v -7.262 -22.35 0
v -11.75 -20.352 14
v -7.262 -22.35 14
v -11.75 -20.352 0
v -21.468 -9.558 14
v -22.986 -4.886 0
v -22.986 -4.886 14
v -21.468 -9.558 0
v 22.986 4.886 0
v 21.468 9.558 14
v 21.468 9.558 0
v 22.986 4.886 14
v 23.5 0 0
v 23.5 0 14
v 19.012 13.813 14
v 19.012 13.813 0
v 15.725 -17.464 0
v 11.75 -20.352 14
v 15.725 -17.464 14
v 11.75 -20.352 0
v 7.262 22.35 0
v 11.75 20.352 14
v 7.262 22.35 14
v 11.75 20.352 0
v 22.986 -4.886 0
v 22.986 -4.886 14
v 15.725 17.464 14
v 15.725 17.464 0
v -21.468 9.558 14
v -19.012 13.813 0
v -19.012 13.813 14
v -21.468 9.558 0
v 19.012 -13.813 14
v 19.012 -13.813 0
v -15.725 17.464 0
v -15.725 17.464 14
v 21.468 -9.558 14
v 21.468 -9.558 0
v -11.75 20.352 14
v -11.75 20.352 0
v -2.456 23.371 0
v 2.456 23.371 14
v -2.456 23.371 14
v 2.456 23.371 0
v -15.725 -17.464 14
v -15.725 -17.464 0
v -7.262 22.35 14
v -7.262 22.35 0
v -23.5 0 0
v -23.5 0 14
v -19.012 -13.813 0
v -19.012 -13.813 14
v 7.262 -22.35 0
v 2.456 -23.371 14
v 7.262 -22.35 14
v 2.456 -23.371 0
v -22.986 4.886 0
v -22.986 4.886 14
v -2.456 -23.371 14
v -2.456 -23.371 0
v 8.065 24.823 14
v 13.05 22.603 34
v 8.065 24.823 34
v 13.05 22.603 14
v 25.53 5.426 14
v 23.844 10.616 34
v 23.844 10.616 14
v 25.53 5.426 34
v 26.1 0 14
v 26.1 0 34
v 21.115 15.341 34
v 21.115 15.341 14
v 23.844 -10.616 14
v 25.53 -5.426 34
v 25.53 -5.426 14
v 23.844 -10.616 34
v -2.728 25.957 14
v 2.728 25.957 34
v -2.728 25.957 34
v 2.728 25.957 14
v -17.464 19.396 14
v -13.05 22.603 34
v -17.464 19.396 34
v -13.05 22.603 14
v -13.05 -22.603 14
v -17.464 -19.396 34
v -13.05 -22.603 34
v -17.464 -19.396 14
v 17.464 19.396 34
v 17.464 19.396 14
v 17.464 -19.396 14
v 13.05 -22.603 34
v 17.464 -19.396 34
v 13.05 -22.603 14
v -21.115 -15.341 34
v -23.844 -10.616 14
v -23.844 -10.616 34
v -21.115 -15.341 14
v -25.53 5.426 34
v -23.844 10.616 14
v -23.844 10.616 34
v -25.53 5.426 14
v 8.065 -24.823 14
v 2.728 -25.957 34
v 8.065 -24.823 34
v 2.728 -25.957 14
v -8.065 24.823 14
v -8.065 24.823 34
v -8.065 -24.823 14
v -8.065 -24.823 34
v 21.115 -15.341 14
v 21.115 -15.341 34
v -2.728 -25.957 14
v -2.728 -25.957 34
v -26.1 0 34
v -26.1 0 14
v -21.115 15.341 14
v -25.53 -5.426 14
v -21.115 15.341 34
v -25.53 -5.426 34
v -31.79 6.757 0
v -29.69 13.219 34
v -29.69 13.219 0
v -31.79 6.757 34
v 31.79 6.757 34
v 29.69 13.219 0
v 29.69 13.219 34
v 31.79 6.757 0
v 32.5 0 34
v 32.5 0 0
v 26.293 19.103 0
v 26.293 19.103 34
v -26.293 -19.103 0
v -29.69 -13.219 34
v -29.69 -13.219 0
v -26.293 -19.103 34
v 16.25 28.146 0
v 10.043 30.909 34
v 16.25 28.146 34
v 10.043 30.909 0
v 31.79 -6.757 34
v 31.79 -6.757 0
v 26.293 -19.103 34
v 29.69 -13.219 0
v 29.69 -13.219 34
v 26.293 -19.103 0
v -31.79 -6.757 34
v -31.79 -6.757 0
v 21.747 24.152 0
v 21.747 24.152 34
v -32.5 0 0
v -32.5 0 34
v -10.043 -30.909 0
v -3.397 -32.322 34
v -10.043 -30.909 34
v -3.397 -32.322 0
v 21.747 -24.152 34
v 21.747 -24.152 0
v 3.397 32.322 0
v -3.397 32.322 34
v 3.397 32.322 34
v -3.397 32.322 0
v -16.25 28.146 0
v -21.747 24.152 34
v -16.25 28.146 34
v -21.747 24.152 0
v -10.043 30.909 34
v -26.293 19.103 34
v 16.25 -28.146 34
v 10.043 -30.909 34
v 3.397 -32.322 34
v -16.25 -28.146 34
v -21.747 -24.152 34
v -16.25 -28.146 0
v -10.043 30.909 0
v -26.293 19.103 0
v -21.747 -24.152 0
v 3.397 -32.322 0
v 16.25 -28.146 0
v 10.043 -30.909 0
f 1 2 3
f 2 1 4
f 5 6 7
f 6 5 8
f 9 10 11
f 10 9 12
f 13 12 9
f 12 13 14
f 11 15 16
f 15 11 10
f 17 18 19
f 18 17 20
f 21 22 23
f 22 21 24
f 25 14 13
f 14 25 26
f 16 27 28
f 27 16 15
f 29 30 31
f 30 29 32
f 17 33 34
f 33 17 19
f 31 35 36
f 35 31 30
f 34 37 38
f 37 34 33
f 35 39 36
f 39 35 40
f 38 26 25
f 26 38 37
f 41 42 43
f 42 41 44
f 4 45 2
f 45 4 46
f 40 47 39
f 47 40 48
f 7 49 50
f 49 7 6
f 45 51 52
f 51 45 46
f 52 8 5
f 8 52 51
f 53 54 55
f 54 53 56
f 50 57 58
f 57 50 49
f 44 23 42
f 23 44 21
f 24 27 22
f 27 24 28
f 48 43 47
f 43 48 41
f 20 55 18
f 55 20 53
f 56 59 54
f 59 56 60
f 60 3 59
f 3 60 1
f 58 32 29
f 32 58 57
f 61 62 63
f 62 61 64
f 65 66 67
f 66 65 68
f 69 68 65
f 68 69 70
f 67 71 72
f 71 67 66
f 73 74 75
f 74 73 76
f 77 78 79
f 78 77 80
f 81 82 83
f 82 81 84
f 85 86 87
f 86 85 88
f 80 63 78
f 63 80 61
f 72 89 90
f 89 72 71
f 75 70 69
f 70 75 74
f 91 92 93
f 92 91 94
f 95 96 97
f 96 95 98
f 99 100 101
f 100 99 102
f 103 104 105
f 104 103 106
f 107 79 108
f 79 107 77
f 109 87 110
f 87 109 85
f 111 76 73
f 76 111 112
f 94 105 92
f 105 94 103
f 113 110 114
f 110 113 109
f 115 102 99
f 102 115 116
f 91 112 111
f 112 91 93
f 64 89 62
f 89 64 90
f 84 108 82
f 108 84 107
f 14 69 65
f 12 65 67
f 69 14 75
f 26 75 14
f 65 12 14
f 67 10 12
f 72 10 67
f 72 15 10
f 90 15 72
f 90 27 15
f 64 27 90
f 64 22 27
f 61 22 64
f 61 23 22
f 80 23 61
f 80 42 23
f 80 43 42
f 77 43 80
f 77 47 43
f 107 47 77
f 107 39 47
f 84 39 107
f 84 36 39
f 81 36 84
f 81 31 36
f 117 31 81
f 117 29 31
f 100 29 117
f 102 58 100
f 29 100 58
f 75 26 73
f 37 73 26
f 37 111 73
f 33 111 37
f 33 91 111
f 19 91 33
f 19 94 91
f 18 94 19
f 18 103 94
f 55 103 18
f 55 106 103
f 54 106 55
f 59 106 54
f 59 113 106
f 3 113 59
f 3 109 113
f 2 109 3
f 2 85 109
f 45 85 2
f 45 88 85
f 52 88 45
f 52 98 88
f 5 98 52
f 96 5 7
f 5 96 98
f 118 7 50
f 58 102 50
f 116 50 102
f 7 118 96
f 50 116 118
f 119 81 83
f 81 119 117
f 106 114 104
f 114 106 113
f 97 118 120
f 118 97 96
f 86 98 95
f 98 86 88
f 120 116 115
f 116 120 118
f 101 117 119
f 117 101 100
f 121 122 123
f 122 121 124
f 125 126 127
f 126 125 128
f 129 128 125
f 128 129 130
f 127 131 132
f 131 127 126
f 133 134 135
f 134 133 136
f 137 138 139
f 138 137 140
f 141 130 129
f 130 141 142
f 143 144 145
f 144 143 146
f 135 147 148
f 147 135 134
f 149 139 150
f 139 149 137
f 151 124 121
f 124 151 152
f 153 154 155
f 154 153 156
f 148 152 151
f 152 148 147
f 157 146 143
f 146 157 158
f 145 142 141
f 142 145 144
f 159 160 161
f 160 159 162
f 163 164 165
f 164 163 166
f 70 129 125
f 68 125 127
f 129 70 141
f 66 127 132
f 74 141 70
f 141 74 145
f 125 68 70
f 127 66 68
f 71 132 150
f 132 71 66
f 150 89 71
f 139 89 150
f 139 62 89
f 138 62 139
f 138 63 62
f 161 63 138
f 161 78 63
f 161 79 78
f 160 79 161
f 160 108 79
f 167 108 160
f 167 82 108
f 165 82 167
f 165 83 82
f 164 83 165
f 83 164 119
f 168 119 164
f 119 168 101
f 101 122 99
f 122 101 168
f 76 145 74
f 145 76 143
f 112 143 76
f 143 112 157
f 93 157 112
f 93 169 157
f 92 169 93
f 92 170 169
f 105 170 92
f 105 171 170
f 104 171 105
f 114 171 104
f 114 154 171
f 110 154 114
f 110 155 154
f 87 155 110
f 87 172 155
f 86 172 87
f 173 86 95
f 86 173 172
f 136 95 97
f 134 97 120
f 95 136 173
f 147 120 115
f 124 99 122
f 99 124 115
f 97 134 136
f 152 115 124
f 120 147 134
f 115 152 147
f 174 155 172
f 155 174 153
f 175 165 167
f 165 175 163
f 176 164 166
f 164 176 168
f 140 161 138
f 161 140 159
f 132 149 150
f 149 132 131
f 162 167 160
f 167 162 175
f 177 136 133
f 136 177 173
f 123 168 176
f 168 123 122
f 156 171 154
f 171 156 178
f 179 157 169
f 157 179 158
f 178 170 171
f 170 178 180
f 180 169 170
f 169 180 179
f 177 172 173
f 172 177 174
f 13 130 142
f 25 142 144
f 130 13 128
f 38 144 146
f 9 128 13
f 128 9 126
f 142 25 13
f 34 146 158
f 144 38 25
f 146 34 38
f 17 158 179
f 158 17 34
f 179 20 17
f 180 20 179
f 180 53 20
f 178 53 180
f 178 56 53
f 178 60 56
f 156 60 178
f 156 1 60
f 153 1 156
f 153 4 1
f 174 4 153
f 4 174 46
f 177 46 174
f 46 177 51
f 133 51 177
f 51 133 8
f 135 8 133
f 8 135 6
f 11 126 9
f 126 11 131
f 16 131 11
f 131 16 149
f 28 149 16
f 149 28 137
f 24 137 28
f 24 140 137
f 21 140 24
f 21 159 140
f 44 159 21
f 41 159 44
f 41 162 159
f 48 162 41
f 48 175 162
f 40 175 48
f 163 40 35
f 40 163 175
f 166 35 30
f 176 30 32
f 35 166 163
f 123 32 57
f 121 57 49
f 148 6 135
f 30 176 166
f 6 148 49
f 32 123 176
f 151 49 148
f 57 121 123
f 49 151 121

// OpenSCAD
// file: verticalShaftHolderPivotPoint.scad
include <parameters/commonParameters.scad>;
include <parameters/verticalShaftHolderParameters.scad>;
// Example part to sit on the verticalShaftHolder
// including holding a roller bearing

// The bottom should be no narrower than thrustBearingMinimumAbutmentDiameter,
// But it can be much bigger.

// The idea is that sits ON the thrust bearing, and holds a roller bearing to minimize friction around the center shaft,
// for times when there is angular stress on the system.

module verticalShaftHolderPivotPoint(outsideDiameter = thrustBearingMinimumAbutmentDiameter, rollerBearingHeightAboveThrustBearing = thrustBearingHeight) {
    difference() {
        // Height and width of this part are minimums.
        echo(rollerBearingHeightAboveThrustBearing + rollerBearingHeight);
        cylinder(h = rollerBearingHeightAboveThrustBearing + rollerBearingHeight, d =
        outsideDiameter);
        union() {
            translate([0, 0, - 1]) // -1 just ensures we clear the bottom and don't leave a 2d "film"
                cylinder(h = 200, d = thrustBearingOuterDiameterShaftWasher);
            translate([0, 0, rollerBearingHeightAboveThrustBearing])
                cylinder(h = 200, d = rollerBearingOutsideDiameter);
        }
    }
}

// Remember that the thrust bearing fits between these two parts,
// In theory one could "encapsulate" it, but remember the top and bottom
// of the thrust washer have the same outside diameter, so you can't "squeeze" it.
// In theory the INSIDE of this part should hold everything in place.

// The only possible "slop" is that the roller ball carrier and the top of the thrust bearing could "rattle" a little, but I think that the groove in the top and bottom pieces
// will center it rapidly.
// Not to mention pinning it relatively tighly will prevent it "poppping out".

// If that is an issue though, we could "capture" or "squeeze" the top "washer"
// of the thrust bearing.

// The MINIMUM outside diameter is thrustBearingMinimumAbutmentDiameter,
// which is the default if no argument is given,
// But to fully use the entire surface of the thrust washer use thrustBearingOutsideDiameter
verticalShaftHolderPivotPoint(outsideDiameter = thrustBearingOutsideDiameter);
// file: modules/legsAroundTheCenterPoint.scad
include <jointModule.scad>;

module legsAroundTheCenterPoint(legCount = 1, legLength = false, includeTriangleSupports = true) {
    legSpacingInDegrees = 360 / legCount;

    // TODO: Triangle parameters should be arguments to the function.
    //       and/or use some fancy math to generate.
    jointLegs = [for (i = [0:legCount - 1]) legInstance(rotation = [0, 90, legSpacingInDegrees * i], insideDiameter =
    horizontalPipeInsideDiameter,
    flatBottom = true, pinHole = true, length = legLength, triangleSupport = includeTriangleSupports ? [15, - 21 + legSpacingInDegrees * i, 50] : false)];
    joint(jointLegs, horizontalPipeInsideDiameter, true);
}
// file: modules/jointModule.scad
// Modules
// legs is a vector of legs,
//      each leg is a vector containing:
//      vector of the joint rotation
// horizontalPipeInsideDiameter
// Optional Boolean requesting addition of a flat bottom
// Optional Boolean or number requesting a hole drilled near the end,
//      If it is a number, this is the angle at which it should be drilled.
//      For historical reasons, 0 and true are equivalent
//      Use false when you need to skip this but still add another vector entry
// Option integer indicating an override for the length of this leg
// i.e. [[x, y, z], horizontalPipeInsideDiameter]

/*
i.e.
jointLegs = [
        [[0, 90, 0], horizontalPipeInsideDiameter, true, true],
        [[90, 90, 0], horizontalPipeInsideDiameter, true, 45],
        [[90, 90, 180], horizontalPipeInsideDiameter, true, 90, 500],
    ];

 */

// This function makes creating the array for the joint module much easier.
// Just name any parameters and skip those you don't care about and defaults will be injected.
// The only REQUIRED paremeter is the insideDiameter, although a suitable default could be added here (instead of 0, so technically it isn't required).
function legInstance(rotation = [0, 0, 0], insideDiameter = 0, flatBottom = false, pinHole = false, length = false,
triangleSupport = false, labelText = false, reverseText = false) = [rotation,
  insideDiameter, flatBottom, pinHole, length, triangleSupport, labelText, reverseText];

// Pinholes have to be further from the ends because the ends are cut off to fit in the print bed.
module joint(legs = [], sphereJointInsideDiameter = 0, closeUpWithSphere = false, addCircleToFlatBottom = false, jointPinHoleOffset = jointPinHoleOffset)
{
  difference()
    {
      // Build
      union() color(JointColor)
        {
          for (leg = legs) {
            thisJointLegLength = len(leg) > 4 && leg[4] != false ? leg[4] : jointLegLength;
            rotate(leg[0])
              cylinder(
              h = thisJointLegLength,
              r = (leg[1] + jointWallThickness * 2) / 2);

            // Add flat bottom
            if (leg[2]) {
              rotate(leg[0])
                translate([
                    (leg[1] / 2) + (jointWallThickness / 2),
                  0,
                    thisJointLegLength / 2
                  ])
                  cube([
                    jointWallThickness,
                    // The 0.5 is a guess at width. A parameter would probably be better.
                      leg[1] * 0.5,
                    thisJointLegLength
                    ],
                  center = true);
            }

            // Triangles for improving stength
            if (len(leg) > 5 && leg[5] != false) {

              // TODO: Document this
              thisTrianglePointA = leg[5][0] ? leg[5][0] : 10;
              thisTriangleRotateZ = leg[5][1] ? leg[5][1] : leg[0][2] * 1.5;
              thisTrianglePointB = leg[5][2] ? leg[5][2] : 40;
              thisTriangleRotatex = leg[5][3] ? leg[5][3] : 90 - leg[0][1];
              thisTriangleRotateY = leg[5][4] ? leg[5][4] : 0;

              rotate([thisTriangleRotatex, thisTriangleRotateY, thisTriangleRotateZ])
                linear_extrude(height = 8, center = true, convexity = 10, twist = 0)
                  polygon(points = [[thisTrianglePointA, thisTrianglePointB], [0, 0], [
                    thisTrianglePointB, thisTrianglePointA]],
                  paths =
                    [[0, 1, 2]]);
            }
          }

          if (closeUpWithSphere)
          // Use a Sphere to close up the gap between the pipes.
          // This is kinda hacky, but it looks good to me and does the job.
            sphere(d = sphereJointInsideDiameter + jointWallThickness * 2);

          if (addCircleToFlatBottom)
          // Add a cylinder at the end of the leg to close any gap between leg flats
          // This also creates a solid floor in case the sphere is so big
          // that the cut below cuts off the bottom of it.
            rotate(legs[0][0])
              rotate([0, 90, 0])
                translate([
                  0,
                  0,
                    legs[0][1] / 2,
                  ])
                  cylinder(h = jointWallThickness, r = (legs[0][1] * 0.5) / 2);

        }

      // Hollow out
      union()
        {
          for (leg = legs) {
            thisJointLegLength = len(leg) > 4 && leg[4] != false ? leg[4] : jointLegLength;
            // The -0.01 ensures that the end of the tube is clear.
            rotate(leg[0]) translate([0, 0, - 0.01]) cylinder(
            h = thisJointLegLength + 0.02, r = leg[1] / 2);

            // IF a flat bottom was added, also add a "cut" to ensure nothing
            // else in the part extends below this flat bottom.
            if (leg[2]) {
              rotate(leg[0])
                translate([
                    (leg[1] / 2) + (jointWallThickness * 2),
                  0,
                    thisJointLegLength / 2
                  ])
                  cube([
                    // The 0.00001 just ensures it doesn't clip the flat on the legs at all.
                        jointWallThickness * 2 - 0.00001,
                      leg[1] * 2,
                      thisJointLegLength * 2
                    ],
                  center = true);
            }
            if (len(leg) > 3 && leg[3] != false) {
              // Make a hole near the end of the leg for pinning
              // The -0.01 ensures that the end of the tube is clear.
              rotate([leg[0][0] + 90, leg[0][1], leg[0][2]])
                translate([0,
                    thisJointLegLength - jointPinHoleOffset, 0])
                  rotate([0, leg[3] == true ? 0 : leg[3],
                    0])
                    cylinder(
                    h = leg[1] + jointWallThickness * 2 + 0.01, d = jointPinningHoleDiameter, center
                    = true);
            }
            // Add text to bottom of a flat leg
            if (len(leg) > 6 && leg[6] != false) {
              rotate([leg[0][0], leg[0][1] + 90, leg[0][2]])
                translate([
                      - thisJointLegLength + jointPinHoleOffset + jointPinningHoleDiameter
                  ,
                  0,
                        sphereJointInsideDiameter / 2 + jointWallThickness - 1
                  ])
                  mirror([0, leg[7] == true ? 1 : 0, 0])
                    linear_extrude(1.1)
                      text(leg[6], size = 5, font = "Liberation Mono", valign = "center", halign =
                      "left");
            }
          }

          if (closeUpWithSphere) {
            // Hollow out the sphere
            sphere(d = sphereJointInsideDiameter);
          }

        }
    }
}
// file: parameters/verticalShaftHolderParameters.scad
// https://paper.dropbox.com/doc/Shaft-Holder-with-Bearings--BPUd0R93dqpLMge3XfPWzi2zAg-a79LjXcU3vrNJJHZMteSG

rollerBearingInsideDiameter = 45; // Same as Thrust Bearing bore diameter
rollerBearingHeight = 20;
rollerBearingOutsideDiameter = 52.2;

thrustBearingOutsideDiameter = 65;
thrustBearingHeight = 14;
thrustBearingOuterDiameterShaftWasher = 47;

thrustBearingMinimumAbutmentDiameter = 57; // This is a MINIMUM

comfortablePinningDiameter = 55; // Could maybe be bigger?
comfortablePinnedSectionHeight = 20; // May need testing
// file: parameters/commonParameters.scad
// All measurements in millimeters

// "horizontal" and "vertical" refer to how they are printed on the print bed,
// not how they work on the final assembly.
// ALWAYS print verticle pipes straight up if possible, that is 90 degrees from the bed.
// Attempting to print a slanted pipe will be troublesome and require testing for a proper size.
// However, you can print ANY angle ON the bed.

// 1.25" PVC Pipe:
horizontalPipeInsideDiameter_1_25pvc = 42.9;
verticalPipeInsideDiameter_1_25pvc = 42.5;

// 0.5" PVC Pipe:
horizontalPipeInsideDiameter_0_50pvc = 22.1;
verticalPipeInsideDiameter_0_50pvc = 21.7;

// Parameters
jointLegLength = 50;
jointWallThickness = 3.5;
jointPinningHoleDiameter = 7;
jointPinHoleOffset = 10;

// Walker Foot Parameters
inchesToMmConversionFactor = 25.4;

// Current idea is 11 x 21 inches.
walkerFootHeight = 11 * inchesToMmConversionFactor;
walkerFootLength = 21 * inchesToMmConversionFactor;
// Back of Foot is 4 inches longer to cause foot to hang AND LOOK as desired
// I tried 1 inch and it had basically NO affect on how it hangs.
// I think it looks cool at 4 inches, so I am going to test that.
// I *THINK* that it actually doesn't affect lenght of the walker, because the front
// of one compensates for the back of the other.
walkerFootCenterOffset = 0 * inchesToMmConversionFactor; // Remember to multiply any offset by the conversion factor.
walkerFootFrontLength = (walkerFootLength / 2) - (walkerFootCenterOffset / 2);
walkerFootBackLength = (walkerFootLength / 2) + (walkerFootCenterOffset / 2);

footLowerJointLegLength = 75;

// Angles
// This site is great for visualizing what you want: https://www.blocklayer.com/trig/scaleneeng.aspx
// Use this site to check your math and results: https://www.calculator.net/right-triangle-calculator.html
//echo("=======================================================");
//echo("Walker Foot Parameters");
//echo("walkerFootLength", walkerFootLength, walkerFootFrontLength + walkerFootBackLength);
//echo("=======================================================");
//echo("Front:");
//echo("walkerFootHeight (a)", walkerFootHeight);
//echo("walkerFootFrontLength (b)", walkerFootFrontLength);
//walkerFootFrontTriangleTopLength = sqrt(pow(walkerFootHeight, 2) + pow(walkerFootFrontLength, 2));
//echo("walkerFootFrontTriangleTopLength (c)", walkerFootFrontTriangleTopLength);
//walkerFootFrontJointAngle = asin(walkerFootHeight / walkerFootFrontTriangleTopLength);
//echo("walkerFootFrontJointAngle (α):", walkerFootFrontJointAngle);
//walkerAnkleFrontAngle = asin(walkerFootFrontLength / walkerFootFrontTriangleTopLength);
//echo("walkerAnkleFrontAngle (β)", walkerAnkleFrontAngle);
//echo("-------------------------------------------------------");
//echo("Back");
//echo("walkerFootBackLength (b)", walkerFootBackLength);
//walkerFootBackTriangleTopLength = sqrt(pow(walkerFootHeight, 2) + pow(walkerFootBackLength, 2));
//echo("walkerFootBackTriangleTopLength (c)", walkerFootBackTriangleTopLength);
//walkerFootBackJointAngle = asin(walkerFootHeight / walkerFootBackTriangleTopLength);
//echo("walkerFootBackJointAngle (α):", walkerFootBackJointAngle);
//walkerAnkleBackAngle = asin(walkerFootBackLength / walkerFootBackTriangleTopLength);
//echo("walkerAnkleBackAngle (β)", walkerAnkleBackAngle);
//echo("=======================================================");



// This height is purely based on giving space for nice triangles supports.
// It could be shorter, just be sure to adjust the triangles.
walkerBodyLowerShaftHolderRollerBearingHeightAboveThrustBearing = 50;

// 12v Battery Box
batteryHolderWallThickness = 5;

// Battery Dimensions
// https://www.power-sonic.com/product/ps-1290/
batteryHeight = 94;
batteryWidth = 65.6; // Ben uses 65.6, Web Site says 65
batteryLength = 150.6; // Ben uses 150.6, Web site says 141
batteryBoxDepth = 60; // This is arbitrary. Ben uses 60 for the Dalek

// Colors
JointColor = "CornflowerBlue";
PipeColor = "Pink";

// Resoution
// This is perfect for 3D Printing,
// but you may want to comment it out while working to improve preview
// performance
//$fa = 1;
//$fs = 0.4;
// Although this makes it VERY high rez, which might be better for the slicer? Experimenting with it instead.
// NOTE that using $fn causes FreeCAD and hence .step files exported to Fusion 360 to show round items as a series of faces instead of a single object.
//$fn = 500;
// main file
include <parameters/commonParameters.scad>;
include <parameters/verticalShaftHolderParameters.scad>;

// Pick what size pipes you are using
horizontalPipeInsideDiameter = horizontalPipeInsideDiameter_0_50pvc;
shaftPipeInsideDiameter = verticalPipeInsideDiameter_1_25pvc;

include <modules/jointModule.scad>;
include <modules/legsAroundTheCenterPoint.scad>;
include <verticalShaftHolderPivotPoint.scad>;

// TODO: Should this part incorporate the batteryholder?
// TODO: This part needs to accomodate a thrust bearing on top and a pinned piece above it.

module WalkerBodyLowerCenterShaftRotationPoint() {
    difference()
        {
            union()
                {
                    legsAroundTheCenterPoint(legCount = 4, legLength = 80, includeTriangleSupports = false);

                    // Extra triangle supports
                    horizontalSupportTriangleSize = 40;
                    trianglePositions = [0, 90, 180, 270];
                    for(trianglePosition = trianglePositions) {
                        rotate([0, 270, trianglePosition])
                            translate([12, 30, 0])
                                linear_extrude(height = 8, center = true, convexity = 10, twist = 0)
                                    polygon(points = [[horizontalSupportTriangleSize, 0], [0, 0], [0,
                                        horizontalSupportTriangleSize]],
                                    paths =
                                        [[0, 1, 2]]);
                    }
                }
            union()
                {
                    // The -0.01 ensures that the end of the tube is clear.
                    translate([0, 0, - 100])
                        cylinder(h = 200, d = thrustBearingOutsideDiameter);
                }
        }

    translate([0, 0, - horizontalPipeInsideDiameter / 2 - jointWallThickness])
        verticalShaftHolderPivotPoint(outsideDiameter = thrustBearingOutsideDiameter, rollerBearingHeightAboveThrustBearing = walkerBodyLowerShaftHolderRollerBearingHeightAboveThrustBearing);
}

//WalkerBodyLowerCenterShaftRotationPoint();
